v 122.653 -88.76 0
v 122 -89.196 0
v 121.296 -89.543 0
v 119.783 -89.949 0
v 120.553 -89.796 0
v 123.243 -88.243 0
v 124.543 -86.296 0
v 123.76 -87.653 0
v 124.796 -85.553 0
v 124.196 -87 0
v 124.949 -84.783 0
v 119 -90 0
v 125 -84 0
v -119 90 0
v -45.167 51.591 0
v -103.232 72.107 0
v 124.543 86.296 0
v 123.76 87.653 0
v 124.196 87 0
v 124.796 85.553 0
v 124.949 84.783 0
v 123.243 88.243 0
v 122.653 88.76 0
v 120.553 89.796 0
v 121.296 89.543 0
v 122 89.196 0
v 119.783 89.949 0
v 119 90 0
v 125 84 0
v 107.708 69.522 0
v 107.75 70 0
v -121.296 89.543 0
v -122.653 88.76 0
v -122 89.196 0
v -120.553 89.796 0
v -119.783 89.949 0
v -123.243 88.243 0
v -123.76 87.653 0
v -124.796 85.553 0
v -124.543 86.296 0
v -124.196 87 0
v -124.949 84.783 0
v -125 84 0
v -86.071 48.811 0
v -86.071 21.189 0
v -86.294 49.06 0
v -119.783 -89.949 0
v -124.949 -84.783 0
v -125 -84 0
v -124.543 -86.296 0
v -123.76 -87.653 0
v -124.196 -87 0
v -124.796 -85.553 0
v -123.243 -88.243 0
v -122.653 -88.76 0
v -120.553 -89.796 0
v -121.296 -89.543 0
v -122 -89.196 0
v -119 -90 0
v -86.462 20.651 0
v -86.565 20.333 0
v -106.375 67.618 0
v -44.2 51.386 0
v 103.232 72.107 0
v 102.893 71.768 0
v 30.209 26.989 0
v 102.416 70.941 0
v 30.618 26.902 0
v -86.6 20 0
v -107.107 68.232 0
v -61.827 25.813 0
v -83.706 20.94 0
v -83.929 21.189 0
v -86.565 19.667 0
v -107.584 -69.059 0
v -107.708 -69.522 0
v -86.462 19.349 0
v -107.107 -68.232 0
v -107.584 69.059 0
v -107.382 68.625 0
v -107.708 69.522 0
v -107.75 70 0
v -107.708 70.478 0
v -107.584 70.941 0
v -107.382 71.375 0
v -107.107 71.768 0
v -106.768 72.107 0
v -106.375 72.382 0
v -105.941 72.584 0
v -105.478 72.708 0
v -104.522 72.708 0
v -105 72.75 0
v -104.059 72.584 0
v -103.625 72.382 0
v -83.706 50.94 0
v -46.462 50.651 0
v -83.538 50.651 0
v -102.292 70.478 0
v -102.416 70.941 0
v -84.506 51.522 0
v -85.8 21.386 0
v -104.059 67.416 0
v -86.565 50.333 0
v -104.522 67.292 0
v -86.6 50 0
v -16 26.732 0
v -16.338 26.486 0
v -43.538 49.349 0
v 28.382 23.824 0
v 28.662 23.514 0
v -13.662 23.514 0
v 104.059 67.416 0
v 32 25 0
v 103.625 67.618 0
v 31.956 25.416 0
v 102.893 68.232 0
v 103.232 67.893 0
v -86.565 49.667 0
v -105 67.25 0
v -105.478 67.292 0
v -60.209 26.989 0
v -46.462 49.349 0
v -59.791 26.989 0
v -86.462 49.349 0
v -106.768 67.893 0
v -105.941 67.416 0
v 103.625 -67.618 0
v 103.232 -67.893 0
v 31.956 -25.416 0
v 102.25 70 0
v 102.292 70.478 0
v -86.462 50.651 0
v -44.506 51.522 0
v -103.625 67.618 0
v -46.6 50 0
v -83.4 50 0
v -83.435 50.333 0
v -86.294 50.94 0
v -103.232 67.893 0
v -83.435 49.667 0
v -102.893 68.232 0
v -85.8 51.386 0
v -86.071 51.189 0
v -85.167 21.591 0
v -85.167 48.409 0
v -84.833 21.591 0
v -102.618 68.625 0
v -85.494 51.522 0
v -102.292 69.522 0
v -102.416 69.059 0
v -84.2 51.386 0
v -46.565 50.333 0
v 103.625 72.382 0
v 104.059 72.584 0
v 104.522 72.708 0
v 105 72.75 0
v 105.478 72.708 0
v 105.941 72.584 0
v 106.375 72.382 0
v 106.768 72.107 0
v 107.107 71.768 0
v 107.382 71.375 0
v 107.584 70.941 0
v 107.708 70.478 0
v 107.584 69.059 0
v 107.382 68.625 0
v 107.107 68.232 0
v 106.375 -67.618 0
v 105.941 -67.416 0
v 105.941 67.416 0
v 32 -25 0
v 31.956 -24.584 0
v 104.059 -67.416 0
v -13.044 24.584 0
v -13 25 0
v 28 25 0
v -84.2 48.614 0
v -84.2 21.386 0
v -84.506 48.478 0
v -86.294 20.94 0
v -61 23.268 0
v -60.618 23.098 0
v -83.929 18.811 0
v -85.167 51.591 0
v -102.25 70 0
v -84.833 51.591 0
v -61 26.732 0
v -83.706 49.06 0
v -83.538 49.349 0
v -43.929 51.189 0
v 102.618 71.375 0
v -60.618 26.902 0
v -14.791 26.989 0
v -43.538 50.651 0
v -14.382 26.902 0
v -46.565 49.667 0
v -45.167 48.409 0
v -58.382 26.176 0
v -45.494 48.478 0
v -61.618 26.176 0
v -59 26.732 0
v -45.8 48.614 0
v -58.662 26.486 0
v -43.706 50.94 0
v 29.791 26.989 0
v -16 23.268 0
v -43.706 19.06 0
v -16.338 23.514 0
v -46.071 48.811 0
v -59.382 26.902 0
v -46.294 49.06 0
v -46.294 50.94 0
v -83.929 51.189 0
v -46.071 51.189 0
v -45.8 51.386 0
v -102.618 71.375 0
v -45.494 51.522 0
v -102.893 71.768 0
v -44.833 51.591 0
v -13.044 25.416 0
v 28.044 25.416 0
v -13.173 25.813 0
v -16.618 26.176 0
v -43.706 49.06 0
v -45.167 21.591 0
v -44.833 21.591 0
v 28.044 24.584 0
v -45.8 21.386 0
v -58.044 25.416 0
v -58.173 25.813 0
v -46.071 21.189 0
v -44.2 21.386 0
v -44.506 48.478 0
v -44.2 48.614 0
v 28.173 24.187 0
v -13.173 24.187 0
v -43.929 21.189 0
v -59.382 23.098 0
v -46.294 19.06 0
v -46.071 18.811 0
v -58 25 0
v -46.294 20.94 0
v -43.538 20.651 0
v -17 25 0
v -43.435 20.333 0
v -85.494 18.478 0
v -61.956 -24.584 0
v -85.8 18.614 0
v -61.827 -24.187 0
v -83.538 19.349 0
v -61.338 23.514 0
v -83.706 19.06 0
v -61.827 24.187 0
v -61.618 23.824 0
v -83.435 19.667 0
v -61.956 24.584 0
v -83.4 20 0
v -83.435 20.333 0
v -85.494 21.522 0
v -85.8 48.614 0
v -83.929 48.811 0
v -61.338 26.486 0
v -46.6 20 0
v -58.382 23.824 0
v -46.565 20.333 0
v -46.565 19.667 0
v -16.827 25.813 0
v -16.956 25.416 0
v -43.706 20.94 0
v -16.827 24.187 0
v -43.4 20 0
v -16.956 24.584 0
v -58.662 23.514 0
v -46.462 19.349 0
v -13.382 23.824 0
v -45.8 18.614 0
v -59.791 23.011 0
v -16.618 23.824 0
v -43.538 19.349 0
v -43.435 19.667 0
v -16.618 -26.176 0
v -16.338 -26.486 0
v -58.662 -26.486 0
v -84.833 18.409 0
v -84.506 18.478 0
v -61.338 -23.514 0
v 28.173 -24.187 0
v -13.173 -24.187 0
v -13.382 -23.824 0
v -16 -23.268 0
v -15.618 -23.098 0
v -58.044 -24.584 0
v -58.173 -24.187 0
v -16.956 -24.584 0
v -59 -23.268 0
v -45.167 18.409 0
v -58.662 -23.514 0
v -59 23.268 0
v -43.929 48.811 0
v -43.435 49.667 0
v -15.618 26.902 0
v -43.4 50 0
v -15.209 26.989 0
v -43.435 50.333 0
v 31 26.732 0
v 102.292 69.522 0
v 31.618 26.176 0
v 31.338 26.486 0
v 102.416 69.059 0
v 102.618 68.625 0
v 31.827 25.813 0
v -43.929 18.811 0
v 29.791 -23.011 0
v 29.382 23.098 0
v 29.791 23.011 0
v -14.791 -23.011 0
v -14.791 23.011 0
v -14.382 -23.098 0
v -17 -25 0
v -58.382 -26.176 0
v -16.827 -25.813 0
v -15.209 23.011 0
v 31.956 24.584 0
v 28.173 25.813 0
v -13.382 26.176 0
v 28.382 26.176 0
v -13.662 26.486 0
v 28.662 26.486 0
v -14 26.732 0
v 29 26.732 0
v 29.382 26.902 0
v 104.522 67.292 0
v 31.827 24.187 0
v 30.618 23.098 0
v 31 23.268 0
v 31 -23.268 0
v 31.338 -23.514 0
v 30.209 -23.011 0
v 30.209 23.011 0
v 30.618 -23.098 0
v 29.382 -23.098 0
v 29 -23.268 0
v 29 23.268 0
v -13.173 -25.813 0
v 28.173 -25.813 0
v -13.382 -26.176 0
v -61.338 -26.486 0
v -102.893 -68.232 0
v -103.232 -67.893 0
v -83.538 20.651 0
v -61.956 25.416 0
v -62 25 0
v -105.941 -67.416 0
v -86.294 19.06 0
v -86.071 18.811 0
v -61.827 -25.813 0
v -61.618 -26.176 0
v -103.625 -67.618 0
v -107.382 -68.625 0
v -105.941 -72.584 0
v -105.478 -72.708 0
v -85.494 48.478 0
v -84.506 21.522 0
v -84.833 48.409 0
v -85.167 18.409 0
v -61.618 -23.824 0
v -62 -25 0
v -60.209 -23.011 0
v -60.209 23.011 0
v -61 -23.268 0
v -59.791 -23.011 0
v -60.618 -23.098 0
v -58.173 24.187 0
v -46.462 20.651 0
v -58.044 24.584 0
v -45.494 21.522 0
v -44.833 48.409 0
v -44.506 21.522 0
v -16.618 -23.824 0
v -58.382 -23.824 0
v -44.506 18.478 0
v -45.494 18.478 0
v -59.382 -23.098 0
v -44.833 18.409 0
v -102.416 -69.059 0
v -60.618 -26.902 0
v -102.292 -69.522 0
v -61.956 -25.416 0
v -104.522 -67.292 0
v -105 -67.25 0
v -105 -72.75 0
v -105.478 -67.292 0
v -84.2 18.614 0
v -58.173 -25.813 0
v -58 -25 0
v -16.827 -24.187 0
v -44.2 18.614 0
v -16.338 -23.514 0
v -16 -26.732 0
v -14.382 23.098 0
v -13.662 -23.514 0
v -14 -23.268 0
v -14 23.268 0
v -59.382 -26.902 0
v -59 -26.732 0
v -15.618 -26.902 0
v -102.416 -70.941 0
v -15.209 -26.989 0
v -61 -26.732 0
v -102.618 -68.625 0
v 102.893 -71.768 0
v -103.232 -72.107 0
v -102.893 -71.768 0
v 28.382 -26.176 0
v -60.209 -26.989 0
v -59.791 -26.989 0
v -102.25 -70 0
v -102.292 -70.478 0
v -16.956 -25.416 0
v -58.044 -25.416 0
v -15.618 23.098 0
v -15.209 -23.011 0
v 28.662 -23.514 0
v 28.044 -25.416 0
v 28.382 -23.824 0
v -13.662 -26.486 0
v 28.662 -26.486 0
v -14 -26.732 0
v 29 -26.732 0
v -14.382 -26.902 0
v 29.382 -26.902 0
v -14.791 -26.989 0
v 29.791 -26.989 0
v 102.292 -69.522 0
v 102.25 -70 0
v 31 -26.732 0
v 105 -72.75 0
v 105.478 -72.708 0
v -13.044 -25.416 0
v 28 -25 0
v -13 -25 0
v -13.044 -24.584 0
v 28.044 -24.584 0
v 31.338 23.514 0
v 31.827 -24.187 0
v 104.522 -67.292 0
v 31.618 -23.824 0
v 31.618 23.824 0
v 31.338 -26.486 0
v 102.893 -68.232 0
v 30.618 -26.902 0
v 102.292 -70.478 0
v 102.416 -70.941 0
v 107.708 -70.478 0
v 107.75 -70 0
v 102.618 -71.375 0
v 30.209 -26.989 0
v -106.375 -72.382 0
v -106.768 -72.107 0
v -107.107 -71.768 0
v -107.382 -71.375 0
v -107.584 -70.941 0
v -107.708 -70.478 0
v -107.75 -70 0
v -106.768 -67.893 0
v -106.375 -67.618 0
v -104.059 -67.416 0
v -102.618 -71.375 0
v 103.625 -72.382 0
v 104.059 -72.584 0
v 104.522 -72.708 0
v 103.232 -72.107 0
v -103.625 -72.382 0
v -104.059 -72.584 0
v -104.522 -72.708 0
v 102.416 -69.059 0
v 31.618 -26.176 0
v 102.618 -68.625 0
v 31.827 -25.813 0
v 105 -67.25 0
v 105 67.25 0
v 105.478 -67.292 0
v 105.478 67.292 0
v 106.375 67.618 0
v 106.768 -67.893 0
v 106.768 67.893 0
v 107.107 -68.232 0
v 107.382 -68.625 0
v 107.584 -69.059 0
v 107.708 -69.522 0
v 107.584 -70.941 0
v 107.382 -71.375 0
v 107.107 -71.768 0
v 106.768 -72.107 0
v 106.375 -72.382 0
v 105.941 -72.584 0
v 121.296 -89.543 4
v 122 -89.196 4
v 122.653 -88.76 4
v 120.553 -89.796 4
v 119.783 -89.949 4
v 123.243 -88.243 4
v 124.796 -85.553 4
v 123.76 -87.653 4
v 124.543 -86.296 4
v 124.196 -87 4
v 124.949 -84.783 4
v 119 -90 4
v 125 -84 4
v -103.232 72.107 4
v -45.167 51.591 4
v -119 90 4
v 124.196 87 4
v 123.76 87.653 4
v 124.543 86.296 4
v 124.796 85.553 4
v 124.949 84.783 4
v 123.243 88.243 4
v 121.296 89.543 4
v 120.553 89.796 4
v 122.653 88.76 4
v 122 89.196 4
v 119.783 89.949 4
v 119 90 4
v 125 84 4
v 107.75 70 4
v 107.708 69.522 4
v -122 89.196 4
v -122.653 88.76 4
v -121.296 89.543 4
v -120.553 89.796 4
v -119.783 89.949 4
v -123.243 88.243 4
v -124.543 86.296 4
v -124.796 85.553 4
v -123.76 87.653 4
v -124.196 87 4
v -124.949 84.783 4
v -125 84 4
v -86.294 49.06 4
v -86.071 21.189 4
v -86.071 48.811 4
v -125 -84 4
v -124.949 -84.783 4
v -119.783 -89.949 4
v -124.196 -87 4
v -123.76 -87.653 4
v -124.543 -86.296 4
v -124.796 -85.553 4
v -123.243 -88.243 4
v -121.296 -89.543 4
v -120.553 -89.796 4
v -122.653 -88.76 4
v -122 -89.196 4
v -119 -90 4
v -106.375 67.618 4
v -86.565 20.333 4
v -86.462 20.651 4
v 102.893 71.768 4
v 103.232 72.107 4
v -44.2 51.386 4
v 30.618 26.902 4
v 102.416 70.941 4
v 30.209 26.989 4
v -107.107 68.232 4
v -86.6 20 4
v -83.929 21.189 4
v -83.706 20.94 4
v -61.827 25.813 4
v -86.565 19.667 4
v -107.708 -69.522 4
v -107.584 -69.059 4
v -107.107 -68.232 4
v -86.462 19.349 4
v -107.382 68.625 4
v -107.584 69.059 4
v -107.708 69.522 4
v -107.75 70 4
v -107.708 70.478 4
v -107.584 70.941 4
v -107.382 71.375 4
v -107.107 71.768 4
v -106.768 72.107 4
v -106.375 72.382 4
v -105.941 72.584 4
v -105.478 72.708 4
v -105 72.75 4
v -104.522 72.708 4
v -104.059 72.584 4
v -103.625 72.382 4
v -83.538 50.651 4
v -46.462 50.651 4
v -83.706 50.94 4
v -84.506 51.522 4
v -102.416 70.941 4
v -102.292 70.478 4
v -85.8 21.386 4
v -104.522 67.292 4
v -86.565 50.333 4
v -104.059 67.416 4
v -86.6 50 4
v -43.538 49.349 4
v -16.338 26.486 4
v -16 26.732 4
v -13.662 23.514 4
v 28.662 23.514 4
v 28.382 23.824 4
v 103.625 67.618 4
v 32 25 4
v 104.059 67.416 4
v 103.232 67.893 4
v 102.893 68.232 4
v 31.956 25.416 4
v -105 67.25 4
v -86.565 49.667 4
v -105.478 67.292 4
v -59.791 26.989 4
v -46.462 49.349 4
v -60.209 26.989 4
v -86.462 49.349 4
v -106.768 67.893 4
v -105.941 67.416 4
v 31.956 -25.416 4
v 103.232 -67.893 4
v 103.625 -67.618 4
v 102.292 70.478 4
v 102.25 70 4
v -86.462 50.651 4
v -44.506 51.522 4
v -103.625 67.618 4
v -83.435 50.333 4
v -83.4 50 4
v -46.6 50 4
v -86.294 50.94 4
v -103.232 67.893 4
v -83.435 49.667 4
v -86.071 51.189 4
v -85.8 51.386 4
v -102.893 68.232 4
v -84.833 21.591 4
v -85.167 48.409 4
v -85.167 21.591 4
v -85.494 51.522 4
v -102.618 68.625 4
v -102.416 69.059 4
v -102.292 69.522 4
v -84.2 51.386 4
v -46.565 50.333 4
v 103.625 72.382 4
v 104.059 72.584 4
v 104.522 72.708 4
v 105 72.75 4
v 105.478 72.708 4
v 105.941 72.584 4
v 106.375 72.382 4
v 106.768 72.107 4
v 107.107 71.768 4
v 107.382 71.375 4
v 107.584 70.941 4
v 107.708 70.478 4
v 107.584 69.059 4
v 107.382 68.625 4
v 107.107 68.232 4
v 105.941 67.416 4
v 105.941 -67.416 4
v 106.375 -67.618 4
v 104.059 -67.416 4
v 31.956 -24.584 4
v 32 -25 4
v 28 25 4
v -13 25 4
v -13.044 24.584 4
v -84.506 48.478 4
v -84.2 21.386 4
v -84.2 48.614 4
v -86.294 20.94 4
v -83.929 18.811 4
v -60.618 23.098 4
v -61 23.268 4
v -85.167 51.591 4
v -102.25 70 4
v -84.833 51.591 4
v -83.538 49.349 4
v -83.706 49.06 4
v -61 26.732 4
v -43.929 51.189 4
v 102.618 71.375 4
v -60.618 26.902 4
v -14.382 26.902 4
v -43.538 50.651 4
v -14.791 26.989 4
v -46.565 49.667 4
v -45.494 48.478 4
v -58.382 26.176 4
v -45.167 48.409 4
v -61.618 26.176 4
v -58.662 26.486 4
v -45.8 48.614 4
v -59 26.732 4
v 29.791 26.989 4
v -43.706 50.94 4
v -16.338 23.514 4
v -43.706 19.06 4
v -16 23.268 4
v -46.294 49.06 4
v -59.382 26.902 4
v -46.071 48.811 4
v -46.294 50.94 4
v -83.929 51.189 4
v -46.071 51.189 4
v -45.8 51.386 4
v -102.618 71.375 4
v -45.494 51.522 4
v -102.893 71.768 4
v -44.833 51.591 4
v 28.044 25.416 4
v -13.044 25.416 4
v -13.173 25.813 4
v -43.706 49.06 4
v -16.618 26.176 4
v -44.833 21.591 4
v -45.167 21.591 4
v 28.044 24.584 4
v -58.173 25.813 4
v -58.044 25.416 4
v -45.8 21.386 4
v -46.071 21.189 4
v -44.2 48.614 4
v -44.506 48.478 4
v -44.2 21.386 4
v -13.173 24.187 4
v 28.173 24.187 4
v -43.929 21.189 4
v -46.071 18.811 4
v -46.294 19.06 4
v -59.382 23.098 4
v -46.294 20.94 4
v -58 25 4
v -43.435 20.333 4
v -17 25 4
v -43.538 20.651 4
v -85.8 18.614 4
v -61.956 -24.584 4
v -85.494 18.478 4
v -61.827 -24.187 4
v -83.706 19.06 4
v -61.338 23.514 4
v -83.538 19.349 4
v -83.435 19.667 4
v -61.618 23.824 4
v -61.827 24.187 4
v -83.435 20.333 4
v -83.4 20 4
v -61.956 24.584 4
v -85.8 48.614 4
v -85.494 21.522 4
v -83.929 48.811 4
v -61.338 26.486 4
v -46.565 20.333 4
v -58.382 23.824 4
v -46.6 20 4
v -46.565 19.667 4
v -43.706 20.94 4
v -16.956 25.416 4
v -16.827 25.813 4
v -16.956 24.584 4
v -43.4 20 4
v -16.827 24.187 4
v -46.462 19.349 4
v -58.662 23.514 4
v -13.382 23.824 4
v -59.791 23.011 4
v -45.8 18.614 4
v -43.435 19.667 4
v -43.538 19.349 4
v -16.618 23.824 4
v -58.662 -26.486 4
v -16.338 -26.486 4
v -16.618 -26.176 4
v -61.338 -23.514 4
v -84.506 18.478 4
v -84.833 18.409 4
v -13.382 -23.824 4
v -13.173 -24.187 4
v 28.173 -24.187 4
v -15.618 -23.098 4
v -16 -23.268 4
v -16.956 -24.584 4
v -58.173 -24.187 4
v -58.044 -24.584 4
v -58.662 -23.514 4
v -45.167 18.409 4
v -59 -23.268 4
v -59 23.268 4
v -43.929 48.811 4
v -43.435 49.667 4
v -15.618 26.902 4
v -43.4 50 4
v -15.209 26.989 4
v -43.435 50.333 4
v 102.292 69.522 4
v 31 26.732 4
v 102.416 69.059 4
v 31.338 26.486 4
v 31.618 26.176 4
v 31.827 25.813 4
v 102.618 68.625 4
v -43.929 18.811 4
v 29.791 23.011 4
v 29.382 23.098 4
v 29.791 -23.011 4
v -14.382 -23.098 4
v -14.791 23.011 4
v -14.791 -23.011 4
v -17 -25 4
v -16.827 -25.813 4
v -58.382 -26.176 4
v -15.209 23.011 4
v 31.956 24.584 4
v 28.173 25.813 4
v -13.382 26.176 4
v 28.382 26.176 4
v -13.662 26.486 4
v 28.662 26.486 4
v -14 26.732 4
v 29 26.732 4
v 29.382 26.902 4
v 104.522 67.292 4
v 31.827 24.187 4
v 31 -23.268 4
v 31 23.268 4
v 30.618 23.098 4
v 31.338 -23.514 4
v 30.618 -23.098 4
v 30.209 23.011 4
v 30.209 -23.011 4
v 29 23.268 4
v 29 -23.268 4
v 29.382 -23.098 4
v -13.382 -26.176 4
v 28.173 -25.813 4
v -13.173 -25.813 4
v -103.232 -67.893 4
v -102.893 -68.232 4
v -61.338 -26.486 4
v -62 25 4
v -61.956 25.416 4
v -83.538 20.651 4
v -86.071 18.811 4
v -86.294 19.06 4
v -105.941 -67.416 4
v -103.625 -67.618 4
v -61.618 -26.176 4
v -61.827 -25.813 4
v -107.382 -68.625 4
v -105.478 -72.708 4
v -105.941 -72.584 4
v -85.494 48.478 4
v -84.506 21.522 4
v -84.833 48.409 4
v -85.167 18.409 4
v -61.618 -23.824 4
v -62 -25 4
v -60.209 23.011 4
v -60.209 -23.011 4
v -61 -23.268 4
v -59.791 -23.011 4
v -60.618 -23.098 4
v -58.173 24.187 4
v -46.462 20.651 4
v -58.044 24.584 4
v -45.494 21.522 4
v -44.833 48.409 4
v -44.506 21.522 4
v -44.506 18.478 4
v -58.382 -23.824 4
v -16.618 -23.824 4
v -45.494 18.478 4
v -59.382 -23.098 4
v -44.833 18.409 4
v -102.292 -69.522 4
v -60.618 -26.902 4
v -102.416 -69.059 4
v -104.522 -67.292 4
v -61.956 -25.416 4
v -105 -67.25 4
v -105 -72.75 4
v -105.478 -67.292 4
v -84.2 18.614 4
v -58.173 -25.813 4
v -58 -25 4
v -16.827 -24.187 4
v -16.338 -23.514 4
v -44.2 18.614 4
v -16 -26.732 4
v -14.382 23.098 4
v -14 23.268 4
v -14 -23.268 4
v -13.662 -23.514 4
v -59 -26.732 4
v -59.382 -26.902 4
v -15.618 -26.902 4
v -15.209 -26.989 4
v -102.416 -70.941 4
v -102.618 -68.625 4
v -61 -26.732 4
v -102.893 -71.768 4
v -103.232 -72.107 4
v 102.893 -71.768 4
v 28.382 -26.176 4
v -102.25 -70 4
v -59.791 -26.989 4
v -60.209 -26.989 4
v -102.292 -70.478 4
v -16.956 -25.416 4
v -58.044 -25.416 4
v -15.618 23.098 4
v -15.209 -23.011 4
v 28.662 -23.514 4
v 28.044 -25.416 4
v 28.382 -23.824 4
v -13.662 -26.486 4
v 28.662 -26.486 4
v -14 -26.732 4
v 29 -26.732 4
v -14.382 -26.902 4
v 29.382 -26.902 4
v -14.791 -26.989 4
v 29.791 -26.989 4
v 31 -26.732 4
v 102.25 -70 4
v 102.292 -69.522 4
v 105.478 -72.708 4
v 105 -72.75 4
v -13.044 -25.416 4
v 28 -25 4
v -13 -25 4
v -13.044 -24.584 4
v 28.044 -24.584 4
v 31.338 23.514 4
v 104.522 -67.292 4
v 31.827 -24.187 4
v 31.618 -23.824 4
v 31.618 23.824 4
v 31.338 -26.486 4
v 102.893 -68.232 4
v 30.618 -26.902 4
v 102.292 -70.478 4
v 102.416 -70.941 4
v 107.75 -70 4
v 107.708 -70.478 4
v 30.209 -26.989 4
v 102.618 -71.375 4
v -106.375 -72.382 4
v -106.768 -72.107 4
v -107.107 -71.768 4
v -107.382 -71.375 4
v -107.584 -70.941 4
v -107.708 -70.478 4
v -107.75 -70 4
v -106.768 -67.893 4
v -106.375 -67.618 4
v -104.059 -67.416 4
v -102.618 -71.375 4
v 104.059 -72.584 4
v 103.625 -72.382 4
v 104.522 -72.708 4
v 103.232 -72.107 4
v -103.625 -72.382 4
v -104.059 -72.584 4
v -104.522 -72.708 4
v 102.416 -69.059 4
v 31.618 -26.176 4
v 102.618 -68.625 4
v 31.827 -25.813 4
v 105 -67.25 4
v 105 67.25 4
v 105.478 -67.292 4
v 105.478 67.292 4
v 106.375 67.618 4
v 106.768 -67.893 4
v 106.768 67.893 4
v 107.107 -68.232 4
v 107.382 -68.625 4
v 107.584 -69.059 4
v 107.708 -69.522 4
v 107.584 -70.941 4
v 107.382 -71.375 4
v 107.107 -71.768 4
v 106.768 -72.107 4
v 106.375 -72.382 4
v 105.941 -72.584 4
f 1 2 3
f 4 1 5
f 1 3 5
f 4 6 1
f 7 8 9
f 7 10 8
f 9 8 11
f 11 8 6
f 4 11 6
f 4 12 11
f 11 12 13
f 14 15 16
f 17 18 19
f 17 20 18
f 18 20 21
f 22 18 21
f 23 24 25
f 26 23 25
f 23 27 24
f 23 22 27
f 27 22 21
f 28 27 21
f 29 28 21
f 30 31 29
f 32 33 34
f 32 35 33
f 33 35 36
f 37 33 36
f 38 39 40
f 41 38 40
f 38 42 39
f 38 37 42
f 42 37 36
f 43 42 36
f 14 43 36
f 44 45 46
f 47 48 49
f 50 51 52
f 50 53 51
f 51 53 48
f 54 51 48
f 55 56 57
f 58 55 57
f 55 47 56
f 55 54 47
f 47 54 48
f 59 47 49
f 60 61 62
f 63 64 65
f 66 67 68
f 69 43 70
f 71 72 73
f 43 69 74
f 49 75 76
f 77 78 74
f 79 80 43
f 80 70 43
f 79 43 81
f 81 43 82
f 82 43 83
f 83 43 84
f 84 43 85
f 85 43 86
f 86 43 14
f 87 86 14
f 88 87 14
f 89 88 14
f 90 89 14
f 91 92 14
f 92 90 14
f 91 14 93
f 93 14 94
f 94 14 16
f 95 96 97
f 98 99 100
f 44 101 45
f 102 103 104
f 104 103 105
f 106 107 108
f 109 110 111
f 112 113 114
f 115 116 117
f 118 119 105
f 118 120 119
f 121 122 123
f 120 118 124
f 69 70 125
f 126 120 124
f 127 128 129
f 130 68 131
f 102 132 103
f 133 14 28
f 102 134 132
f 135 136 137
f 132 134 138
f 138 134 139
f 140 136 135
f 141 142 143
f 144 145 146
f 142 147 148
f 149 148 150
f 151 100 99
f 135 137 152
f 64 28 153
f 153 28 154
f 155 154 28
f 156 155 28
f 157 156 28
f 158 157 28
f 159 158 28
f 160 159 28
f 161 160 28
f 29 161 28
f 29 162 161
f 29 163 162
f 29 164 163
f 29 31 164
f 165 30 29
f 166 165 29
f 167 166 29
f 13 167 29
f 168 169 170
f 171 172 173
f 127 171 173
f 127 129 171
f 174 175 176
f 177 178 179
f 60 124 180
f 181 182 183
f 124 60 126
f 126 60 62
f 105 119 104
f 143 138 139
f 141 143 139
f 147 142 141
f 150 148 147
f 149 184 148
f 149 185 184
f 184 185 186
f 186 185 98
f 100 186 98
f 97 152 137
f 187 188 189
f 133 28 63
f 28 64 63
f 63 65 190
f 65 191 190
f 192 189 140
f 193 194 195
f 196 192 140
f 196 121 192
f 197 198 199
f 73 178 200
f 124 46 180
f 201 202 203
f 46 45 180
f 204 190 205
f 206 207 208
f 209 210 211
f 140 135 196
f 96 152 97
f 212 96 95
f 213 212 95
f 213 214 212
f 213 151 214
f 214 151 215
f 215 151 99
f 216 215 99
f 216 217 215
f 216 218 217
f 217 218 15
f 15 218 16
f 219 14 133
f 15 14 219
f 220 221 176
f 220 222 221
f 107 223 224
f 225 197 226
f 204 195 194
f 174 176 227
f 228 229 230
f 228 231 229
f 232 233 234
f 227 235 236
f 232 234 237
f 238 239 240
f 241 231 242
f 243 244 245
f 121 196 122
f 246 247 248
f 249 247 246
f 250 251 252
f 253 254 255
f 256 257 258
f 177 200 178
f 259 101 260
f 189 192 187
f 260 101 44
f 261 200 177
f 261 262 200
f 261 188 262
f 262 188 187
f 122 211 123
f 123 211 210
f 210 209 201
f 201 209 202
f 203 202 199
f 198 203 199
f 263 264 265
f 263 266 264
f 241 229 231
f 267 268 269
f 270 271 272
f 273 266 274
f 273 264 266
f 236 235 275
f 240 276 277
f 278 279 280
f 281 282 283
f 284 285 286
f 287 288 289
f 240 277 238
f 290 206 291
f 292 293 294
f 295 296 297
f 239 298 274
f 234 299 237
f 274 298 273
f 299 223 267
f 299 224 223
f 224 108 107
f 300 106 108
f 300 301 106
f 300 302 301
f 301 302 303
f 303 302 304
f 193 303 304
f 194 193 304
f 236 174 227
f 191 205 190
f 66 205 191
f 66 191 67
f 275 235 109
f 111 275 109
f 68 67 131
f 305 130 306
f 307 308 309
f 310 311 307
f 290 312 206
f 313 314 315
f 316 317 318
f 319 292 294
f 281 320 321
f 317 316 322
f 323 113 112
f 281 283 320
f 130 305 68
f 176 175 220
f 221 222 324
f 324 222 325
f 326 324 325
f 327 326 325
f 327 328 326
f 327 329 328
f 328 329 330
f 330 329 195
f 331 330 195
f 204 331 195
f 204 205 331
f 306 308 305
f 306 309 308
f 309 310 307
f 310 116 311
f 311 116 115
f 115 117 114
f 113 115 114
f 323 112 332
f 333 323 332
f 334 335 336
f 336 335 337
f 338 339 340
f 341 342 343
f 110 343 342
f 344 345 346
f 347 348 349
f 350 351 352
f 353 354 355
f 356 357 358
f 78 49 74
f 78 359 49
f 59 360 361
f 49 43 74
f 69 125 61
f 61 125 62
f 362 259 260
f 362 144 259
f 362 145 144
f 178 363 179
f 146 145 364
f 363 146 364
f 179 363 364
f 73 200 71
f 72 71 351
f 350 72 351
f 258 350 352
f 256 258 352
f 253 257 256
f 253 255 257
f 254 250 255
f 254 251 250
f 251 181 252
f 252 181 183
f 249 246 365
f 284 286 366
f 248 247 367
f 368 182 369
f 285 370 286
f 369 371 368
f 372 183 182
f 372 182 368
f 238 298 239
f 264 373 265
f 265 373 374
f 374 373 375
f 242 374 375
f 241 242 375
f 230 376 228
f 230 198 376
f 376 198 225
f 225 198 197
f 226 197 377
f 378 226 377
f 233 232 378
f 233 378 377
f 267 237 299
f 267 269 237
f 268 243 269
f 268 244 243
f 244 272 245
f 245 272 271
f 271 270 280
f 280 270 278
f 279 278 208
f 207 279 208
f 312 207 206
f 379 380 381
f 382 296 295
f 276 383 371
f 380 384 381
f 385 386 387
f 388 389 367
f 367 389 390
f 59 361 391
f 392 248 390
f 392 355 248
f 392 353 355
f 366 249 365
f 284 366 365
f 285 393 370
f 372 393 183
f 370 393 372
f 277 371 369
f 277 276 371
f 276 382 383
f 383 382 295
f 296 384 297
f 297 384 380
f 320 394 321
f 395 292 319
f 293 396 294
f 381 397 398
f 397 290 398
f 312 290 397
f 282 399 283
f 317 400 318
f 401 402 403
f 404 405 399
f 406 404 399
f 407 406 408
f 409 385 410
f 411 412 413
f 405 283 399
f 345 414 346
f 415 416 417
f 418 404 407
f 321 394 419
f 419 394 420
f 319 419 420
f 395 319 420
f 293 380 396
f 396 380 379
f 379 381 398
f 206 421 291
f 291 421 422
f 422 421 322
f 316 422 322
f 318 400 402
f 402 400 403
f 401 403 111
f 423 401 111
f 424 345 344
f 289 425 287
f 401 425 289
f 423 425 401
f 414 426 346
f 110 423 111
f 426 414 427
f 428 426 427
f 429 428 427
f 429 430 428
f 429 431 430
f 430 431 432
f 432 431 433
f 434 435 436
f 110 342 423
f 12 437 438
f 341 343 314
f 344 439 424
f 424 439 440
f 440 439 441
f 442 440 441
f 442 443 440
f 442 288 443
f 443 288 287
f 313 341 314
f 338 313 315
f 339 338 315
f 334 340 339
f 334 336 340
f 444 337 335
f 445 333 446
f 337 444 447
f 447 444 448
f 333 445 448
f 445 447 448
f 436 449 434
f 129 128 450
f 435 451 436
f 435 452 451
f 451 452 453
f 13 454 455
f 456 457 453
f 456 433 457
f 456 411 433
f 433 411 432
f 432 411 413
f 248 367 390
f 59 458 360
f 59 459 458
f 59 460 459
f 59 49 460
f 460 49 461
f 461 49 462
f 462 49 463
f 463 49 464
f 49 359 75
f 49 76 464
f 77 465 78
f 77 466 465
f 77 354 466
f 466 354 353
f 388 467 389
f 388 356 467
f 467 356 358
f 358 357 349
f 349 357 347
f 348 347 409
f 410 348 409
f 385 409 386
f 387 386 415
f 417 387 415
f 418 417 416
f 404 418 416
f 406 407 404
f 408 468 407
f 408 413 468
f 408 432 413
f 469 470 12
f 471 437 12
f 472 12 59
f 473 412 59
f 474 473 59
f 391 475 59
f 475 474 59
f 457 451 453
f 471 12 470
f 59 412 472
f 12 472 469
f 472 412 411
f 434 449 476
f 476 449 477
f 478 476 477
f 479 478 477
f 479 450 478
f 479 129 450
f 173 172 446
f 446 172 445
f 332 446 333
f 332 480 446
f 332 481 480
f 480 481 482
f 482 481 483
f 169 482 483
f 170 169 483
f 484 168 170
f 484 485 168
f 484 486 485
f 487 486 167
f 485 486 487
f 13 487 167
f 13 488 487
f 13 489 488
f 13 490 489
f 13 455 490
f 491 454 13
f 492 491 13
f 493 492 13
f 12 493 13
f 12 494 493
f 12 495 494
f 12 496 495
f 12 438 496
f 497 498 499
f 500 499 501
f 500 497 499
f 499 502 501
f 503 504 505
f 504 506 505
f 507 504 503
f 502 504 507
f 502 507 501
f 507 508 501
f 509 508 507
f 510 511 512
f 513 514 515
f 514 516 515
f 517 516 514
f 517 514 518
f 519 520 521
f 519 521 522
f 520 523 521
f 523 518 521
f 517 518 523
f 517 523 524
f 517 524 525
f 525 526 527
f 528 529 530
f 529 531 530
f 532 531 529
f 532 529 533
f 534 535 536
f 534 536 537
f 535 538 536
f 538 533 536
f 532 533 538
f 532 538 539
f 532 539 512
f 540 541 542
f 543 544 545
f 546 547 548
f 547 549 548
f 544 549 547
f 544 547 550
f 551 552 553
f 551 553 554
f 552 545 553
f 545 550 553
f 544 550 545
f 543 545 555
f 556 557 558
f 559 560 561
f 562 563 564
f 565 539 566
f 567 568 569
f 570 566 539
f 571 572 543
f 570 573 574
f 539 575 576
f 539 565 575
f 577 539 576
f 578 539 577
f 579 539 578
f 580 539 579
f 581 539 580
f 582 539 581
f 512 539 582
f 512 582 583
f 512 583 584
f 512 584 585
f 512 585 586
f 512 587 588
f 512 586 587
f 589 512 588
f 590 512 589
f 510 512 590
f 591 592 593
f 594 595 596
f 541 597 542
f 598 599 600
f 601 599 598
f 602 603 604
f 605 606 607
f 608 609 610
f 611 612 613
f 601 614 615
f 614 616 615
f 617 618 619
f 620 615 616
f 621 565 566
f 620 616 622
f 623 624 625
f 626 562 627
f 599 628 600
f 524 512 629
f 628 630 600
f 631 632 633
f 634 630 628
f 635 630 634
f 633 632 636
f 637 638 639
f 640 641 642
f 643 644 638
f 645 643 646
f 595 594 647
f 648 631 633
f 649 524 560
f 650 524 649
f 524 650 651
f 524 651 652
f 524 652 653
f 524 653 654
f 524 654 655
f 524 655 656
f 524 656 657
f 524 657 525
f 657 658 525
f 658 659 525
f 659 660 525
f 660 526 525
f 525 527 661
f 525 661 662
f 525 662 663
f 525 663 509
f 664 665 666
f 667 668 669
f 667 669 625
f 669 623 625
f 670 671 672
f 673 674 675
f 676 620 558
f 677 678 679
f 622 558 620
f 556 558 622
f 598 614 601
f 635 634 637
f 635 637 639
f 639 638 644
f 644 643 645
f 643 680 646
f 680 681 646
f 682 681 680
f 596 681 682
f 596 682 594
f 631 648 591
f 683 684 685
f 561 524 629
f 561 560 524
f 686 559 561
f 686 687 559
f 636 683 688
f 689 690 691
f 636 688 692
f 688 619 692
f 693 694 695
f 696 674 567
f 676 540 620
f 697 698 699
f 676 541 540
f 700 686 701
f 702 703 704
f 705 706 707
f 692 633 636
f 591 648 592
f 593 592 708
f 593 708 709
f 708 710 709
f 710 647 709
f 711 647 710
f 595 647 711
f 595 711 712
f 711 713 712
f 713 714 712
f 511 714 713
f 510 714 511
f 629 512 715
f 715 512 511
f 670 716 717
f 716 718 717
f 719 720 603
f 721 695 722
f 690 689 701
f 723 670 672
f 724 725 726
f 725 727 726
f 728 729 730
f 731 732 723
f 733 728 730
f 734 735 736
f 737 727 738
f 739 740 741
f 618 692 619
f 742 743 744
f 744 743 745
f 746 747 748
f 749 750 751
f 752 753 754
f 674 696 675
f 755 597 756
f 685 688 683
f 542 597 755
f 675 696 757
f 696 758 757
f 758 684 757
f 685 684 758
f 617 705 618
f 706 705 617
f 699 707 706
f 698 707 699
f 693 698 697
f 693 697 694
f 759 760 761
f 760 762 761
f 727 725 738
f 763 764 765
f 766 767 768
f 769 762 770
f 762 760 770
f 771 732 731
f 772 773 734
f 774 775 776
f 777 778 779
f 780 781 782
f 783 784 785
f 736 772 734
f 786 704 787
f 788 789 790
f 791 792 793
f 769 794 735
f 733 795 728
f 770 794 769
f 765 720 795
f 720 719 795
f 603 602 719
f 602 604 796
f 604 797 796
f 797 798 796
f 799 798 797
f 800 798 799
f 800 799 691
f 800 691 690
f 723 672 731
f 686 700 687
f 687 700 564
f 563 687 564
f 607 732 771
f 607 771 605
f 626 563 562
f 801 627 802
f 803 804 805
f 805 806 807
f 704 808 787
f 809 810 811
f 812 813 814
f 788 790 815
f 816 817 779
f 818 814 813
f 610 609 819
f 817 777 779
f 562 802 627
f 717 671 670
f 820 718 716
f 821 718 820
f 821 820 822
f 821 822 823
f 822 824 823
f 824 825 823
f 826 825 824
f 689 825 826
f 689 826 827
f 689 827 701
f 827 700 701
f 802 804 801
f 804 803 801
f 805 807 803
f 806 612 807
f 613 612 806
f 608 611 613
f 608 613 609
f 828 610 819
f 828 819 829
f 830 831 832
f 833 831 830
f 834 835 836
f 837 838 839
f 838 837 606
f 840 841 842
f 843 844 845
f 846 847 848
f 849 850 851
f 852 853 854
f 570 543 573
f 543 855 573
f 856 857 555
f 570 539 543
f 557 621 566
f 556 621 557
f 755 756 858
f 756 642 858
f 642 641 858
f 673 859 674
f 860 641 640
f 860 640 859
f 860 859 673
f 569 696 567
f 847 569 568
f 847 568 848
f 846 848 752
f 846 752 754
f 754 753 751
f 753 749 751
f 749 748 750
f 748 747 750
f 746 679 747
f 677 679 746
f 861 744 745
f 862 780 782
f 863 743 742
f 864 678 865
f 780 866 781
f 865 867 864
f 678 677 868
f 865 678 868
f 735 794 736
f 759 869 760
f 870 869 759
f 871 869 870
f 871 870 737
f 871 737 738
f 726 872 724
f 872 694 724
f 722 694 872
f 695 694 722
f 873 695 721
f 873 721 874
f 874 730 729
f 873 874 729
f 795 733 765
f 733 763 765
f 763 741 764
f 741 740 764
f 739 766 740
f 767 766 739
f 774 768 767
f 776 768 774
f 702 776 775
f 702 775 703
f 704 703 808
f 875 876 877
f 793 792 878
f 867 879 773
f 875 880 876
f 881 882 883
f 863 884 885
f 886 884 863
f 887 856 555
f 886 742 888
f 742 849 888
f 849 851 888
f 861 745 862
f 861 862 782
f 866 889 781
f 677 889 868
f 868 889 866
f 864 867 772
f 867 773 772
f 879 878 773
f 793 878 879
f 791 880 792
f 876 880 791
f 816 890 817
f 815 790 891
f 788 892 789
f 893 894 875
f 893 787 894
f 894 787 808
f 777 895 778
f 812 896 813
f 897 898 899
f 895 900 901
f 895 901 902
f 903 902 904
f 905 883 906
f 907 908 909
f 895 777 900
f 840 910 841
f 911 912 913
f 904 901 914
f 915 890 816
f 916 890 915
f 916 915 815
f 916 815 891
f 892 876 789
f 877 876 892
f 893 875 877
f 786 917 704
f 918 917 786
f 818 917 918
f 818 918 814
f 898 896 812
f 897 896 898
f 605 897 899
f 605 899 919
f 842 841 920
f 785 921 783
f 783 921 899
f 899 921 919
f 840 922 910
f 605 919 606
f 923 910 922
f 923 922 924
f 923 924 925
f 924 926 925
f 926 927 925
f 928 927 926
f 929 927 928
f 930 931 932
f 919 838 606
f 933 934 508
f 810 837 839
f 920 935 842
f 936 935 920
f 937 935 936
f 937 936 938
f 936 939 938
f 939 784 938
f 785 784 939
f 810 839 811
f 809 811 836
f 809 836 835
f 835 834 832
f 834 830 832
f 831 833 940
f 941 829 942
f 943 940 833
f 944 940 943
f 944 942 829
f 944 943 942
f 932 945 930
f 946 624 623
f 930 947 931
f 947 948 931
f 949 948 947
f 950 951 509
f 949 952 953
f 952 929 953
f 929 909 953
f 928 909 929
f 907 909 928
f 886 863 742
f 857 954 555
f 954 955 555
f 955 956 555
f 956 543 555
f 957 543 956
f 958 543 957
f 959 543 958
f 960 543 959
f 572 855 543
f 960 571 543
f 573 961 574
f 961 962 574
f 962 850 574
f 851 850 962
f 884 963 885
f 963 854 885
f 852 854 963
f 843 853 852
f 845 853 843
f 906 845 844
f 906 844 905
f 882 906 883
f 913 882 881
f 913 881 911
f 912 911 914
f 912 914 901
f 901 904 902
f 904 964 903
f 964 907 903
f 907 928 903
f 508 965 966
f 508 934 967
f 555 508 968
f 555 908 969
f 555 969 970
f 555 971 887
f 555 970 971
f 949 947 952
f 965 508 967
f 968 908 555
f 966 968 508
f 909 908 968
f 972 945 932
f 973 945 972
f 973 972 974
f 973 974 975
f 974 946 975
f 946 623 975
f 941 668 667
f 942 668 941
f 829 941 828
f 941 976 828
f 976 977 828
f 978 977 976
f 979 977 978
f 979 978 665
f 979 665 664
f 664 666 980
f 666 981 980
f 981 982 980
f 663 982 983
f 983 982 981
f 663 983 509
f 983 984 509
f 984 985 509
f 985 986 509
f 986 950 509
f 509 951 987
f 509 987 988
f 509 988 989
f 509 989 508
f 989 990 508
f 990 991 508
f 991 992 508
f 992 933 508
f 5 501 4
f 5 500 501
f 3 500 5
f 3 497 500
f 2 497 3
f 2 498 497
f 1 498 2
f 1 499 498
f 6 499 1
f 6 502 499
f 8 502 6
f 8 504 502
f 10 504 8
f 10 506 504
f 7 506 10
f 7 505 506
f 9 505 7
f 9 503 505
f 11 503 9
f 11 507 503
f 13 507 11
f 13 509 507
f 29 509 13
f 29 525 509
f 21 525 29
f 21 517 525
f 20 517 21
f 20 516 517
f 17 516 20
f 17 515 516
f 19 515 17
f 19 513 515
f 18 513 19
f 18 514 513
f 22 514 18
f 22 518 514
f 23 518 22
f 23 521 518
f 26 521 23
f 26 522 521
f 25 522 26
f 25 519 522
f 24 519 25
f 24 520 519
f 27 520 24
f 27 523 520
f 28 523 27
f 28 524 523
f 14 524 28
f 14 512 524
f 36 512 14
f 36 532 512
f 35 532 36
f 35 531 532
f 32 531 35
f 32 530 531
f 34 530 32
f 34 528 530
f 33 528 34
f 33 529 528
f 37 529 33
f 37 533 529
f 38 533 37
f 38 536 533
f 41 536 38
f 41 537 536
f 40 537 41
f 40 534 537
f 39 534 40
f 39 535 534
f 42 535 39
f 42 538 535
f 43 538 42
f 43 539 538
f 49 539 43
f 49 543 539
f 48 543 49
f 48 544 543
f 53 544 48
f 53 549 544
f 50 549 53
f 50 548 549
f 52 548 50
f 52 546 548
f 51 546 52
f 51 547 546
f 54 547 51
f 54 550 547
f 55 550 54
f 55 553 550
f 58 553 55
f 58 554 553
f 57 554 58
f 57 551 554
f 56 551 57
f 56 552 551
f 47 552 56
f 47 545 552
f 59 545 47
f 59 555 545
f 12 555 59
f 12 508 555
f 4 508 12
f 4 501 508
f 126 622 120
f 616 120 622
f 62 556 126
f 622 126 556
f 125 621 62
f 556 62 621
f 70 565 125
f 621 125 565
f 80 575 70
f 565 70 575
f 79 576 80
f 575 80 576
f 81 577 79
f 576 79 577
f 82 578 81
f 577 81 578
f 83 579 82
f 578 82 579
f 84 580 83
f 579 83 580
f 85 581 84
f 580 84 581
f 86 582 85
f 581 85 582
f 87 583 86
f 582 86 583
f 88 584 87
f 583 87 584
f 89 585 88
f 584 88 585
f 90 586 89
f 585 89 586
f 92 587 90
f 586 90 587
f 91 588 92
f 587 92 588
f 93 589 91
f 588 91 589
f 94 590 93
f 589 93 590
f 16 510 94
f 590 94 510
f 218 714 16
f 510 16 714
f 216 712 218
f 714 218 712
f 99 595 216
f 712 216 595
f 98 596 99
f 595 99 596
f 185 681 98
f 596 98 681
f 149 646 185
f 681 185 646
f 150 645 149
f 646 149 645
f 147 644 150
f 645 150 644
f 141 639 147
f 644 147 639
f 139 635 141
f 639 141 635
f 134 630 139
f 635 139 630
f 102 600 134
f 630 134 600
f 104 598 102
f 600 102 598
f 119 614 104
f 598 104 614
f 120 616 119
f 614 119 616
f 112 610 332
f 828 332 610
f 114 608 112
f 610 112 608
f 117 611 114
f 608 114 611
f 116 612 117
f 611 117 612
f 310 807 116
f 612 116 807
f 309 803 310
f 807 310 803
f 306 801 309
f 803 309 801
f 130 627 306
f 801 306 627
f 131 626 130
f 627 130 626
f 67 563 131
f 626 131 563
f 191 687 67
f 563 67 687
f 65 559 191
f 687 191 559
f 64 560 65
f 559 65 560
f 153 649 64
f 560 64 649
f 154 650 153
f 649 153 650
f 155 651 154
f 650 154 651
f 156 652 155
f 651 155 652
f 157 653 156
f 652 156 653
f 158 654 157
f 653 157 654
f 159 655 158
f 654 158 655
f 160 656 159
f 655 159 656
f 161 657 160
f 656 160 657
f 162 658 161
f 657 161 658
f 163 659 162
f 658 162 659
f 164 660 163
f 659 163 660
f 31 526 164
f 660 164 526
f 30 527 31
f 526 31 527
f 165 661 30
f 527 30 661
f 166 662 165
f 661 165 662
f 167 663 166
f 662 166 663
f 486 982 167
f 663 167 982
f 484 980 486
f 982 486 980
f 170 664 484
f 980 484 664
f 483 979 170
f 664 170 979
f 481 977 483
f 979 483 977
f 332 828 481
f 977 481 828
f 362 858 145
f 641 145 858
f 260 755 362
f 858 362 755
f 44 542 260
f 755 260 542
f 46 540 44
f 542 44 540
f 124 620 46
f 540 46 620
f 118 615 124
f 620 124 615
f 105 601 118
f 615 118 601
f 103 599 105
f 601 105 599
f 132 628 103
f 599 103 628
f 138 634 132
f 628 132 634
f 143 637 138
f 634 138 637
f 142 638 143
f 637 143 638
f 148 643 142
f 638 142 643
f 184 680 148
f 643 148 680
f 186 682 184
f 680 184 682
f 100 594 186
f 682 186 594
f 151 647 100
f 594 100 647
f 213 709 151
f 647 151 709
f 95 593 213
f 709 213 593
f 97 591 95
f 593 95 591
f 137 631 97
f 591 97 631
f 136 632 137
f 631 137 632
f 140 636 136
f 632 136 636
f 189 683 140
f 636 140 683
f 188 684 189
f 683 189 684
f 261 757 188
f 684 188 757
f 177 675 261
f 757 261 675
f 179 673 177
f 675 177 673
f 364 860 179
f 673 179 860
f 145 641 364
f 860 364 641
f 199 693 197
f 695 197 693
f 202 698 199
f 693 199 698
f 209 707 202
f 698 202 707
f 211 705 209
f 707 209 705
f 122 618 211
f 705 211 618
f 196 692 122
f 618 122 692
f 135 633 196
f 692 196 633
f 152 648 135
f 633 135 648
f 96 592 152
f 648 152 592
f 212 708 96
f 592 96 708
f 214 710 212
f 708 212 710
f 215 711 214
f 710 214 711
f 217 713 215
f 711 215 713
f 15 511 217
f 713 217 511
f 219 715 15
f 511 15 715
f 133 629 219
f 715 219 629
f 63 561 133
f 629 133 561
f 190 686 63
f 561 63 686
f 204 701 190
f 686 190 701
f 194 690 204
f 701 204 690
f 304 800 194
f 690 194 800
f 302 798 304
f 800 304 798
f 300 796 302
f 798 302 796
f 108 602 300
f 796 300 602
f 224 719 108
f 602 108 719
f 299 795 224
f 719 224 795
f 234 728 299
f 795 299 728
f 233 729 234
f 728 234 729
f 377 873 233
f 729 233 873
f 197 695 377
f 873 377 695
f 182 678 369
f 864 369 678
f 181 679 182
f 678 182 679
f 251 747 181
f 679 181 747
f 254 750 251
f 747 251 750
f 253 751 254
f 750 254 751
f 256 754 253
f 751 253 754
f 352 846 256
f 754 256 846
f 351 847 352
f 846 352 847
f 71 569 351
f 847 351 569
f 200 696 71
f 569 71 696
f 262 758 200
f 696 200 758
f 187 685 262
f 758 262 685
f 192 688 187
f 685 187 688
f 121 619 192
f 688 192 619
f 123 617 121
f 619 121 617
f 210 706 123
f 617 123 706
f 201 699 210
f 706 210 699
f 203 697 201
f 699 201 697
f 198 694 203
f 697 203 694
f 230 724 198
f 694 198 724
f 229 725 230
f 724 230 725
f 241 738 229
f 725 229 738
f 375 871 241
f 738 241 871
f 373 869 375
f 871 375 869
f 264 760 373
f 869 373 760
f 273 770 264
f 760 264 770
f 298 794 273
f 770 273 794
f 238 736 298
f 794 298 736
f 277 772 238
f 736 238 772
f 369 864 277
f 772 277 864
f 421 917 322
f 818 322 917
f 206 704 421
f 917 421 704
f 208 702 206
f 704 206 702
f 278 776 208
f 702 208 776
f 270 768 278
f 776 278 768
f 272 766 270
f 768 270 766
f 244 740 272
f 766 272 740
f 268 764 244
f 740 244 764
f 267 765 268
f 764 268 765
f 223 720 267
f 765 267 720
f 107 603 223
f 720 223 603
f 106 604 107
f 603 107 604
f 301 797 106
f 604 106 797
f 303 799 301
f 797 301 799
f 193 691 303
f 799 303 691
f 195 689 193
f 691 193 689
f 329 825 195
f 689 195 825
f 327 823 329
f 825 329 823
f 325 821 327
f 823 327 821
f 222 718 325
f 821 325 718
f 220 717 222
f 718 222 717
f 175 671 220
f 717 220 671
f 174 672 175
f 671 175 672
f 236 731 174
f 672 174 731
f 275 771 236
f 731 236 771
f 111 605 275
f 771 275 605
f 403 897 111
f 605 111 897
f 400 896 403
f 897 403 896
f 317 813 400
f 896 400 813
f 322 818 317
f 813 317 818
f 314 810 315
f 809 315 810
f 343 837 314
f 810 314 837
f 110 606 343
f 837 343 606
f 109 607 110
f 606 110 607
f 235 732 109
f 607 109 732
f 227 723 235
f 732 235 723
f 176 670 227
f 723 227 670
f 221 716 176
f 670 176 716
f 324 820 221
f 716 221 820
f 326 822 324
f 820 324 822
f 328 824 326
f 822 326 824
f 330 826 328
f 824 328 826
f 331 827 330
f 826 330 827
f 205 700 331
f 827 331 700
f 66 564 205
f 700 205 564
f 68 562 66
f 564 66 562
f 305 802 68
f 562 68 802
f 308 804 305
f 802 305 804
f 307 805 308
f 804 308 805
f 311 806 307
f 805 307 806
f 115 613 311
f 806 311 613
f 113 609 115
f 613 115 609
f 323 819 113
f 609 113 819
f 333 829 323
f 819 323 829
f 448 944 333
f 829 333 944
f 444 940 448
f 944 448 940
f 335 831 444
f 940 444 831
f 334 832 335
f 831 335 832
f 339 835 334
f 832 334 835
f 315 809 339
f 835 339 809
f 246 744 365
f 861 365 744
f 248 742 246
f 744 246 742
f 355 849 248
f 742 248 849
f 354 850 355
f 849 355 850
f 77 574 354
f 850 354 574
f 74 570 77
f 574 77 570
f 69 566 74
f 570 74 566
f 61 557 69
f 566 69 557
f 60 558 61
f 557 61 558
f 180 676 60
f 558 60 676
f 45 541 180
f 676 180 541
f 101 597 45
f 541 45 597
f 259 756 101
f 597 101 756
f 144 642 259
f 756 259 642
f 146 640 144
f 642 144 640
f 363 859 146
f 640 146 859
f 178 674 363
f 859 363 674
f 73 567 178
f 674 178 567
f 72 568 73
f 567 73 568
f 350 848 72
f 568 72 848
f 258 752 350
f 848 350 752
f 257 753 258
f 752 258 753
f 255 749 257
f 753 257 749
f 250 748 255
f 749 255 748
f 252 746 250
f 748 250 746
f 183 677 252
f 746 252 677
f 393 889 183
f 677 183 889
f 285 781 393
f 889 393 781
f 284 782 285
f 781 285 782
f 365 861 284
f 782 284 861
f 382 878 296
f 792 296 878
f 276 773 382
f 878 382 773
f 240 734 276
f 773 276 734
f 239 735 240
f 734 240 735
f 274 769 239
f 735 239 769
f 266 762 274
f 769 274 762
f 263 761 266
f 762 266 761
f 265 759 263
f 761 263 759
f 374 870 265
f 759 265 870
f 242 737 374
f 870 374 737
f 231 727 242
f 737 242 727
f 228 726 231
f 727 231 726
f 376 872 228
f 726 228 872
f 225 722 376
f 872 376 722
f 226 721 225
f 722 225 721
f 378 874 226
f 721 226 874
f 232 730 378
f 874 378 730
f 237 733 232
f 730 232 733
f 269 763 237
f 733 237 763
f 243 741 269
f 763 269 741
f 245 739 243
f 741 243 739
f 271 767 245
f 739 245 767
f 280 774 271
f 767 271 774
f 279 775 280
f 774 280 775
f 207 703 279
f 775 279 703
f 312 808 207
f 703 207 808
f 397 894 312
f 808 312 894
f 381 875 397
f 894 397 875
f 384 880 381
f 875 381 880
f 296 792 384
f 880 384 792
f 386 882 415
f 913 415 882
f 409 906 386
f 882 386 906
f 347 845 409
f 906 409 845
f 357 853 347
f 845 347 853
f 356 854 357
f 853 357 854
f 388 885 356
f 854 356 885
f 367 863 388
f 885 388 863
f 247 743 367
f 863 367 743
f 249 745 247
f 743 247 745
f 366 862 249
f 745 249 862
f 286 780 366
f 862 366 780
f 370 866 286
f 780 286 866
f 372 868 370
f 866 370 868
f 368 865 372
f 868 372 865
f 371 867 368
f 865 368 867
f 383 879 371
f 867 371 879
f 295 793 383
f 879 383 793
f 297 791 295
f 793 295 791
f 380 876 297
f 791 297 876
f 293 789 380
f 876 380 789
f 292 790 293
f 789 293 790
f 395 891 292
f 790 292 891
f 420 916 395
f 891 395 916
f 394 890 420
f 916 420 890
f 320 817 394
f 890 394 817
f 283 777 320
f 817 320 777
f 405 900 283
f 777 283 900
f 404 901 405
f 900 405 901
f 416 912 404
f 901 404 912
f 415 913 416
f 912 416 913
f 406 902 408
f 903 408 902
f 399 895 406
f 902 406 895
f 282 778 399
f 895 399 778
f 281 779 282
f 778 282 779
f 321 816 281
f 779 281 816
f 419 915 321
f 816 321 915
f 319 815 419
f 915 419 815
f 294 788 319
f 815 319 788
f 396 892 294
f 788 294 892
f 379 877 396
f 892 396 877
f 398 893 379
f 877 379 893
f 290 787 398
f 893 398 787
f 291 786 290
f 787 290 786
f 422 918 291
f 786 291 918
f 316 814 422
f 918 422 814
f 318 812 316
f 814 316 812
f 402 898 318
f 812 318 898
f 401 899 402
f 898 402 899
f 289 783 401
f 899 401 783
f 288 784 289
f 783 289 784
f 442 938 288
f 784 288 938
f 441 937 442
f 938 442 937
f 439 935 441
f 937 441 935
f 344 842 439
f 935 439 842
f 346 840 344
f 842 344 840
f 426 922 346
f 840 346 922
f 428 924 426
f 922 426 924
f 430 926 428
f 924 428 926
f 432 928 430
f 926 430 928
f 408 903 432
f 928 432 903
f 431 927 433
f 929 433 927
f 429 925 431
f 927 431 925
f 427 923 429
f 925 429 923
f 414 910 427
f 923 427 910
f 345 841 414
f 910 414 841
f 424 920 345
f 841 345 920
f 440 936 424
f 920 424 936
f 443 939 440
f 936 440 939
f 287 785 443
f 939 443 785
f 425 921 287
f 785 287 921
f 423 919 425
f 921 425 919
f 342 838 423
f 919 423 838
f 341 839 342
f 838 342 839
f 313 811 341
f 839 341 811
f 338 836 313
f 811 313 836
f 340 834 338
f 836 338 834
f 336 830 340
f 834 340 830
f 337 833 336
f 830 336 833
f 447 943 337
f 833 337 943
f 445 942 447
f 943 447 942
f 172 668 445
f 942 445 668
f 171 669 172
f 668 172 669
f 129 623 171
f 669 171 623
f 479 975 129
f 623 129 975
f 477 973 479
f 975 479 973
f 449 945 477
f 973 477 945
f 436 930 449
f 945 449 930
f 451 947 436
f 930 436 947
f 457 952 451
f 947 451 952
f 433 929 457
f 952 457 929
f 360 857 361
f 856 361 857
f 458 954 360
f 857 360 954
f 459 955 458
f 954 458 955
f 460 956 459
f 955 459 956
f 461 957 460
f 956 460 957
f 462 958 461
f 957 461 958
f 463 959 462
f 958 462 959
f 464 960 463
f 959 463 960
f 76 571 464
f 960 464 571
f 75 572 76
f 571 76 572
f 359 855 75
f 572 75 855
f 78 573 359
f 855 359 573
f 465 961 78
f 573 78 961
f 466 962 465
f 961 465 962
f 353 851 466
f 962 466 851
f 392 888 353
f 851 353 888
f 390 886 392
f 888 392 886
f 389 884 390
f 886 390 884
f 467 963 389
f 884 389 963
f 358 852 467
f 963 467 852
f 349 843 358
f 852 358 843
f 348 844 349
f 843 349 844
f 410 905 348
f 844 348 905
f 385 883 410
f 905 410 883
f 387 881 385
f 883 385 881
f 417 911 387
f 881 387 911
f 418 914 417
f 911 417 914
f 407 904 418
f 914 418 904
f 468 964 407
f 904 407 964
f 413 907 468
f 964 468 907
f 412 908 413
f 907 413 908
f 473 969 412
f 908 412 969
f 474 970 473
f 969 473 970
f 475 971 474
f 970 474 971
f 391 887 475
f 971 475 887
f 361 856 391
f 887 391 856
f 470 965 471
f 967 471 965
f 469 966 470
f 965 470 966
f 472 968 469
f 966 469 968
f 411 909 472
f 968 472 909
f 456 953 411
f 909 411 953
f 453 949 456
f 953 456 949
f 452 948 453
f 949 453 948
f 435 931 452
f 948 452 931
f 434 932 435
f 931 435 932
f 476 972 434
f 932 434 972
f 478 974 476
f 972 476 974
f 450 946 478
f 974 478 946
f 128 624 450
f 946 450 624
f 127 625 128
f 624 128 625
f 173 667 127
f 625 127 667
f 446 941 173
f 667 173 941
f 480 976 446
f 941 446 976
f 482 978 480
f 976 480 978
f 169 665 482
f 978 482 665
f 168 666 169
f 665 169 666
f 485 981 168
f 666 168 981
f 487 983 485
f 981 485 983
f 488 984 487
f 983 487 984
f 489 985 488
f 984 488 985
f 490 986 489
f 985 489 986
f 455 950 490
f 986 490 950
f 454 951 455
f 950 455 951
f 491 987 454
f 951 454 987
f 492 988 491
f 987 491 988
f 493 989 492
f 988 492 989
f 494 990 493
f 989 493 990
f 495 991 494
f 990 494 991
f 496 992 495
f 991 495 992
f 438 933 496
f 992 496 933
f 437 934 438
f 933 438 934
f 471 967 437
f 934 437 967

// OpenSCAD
plate_w = 250;
plate_h = 180;
plate_t = 4;
corner_r = 6;

module rr(w,h,r){
  hull(){
    translate([-(w/2-r),-(h/2-r)]) circle(r=r,$fn=48);
    translate([ (w/2-r),-(h/2-r)]) circle(r=r,$fn=48);
    translate([-(w/2-r), (h/2-r)]) circle(r=r,$fn=48);
    translate([ (w/2-r), (h/2-r)]) circle(r=r,$fn=48);
  }
}

linear_extrude(height=plate_t)
  difference(){
    rr(plate_w, plate_h, corner_r);
    for (x=[-105,105]) for (y=[-70,70]) translate([x,y]) circle(d=5.5,$fn=36);
    // ESP32-S3 provisional
    for (x=[-85,-45]) for (y=[20,50]) translate([x,y]) circle(d=3.2,$fn=30);
    // 3 x B-G431B-ESC1 provisional zones
    for (x=[20,65,110]) for (y=[25,-25]) translate([x-80,y]) circle(d=4.0,$fn=30);
  }
